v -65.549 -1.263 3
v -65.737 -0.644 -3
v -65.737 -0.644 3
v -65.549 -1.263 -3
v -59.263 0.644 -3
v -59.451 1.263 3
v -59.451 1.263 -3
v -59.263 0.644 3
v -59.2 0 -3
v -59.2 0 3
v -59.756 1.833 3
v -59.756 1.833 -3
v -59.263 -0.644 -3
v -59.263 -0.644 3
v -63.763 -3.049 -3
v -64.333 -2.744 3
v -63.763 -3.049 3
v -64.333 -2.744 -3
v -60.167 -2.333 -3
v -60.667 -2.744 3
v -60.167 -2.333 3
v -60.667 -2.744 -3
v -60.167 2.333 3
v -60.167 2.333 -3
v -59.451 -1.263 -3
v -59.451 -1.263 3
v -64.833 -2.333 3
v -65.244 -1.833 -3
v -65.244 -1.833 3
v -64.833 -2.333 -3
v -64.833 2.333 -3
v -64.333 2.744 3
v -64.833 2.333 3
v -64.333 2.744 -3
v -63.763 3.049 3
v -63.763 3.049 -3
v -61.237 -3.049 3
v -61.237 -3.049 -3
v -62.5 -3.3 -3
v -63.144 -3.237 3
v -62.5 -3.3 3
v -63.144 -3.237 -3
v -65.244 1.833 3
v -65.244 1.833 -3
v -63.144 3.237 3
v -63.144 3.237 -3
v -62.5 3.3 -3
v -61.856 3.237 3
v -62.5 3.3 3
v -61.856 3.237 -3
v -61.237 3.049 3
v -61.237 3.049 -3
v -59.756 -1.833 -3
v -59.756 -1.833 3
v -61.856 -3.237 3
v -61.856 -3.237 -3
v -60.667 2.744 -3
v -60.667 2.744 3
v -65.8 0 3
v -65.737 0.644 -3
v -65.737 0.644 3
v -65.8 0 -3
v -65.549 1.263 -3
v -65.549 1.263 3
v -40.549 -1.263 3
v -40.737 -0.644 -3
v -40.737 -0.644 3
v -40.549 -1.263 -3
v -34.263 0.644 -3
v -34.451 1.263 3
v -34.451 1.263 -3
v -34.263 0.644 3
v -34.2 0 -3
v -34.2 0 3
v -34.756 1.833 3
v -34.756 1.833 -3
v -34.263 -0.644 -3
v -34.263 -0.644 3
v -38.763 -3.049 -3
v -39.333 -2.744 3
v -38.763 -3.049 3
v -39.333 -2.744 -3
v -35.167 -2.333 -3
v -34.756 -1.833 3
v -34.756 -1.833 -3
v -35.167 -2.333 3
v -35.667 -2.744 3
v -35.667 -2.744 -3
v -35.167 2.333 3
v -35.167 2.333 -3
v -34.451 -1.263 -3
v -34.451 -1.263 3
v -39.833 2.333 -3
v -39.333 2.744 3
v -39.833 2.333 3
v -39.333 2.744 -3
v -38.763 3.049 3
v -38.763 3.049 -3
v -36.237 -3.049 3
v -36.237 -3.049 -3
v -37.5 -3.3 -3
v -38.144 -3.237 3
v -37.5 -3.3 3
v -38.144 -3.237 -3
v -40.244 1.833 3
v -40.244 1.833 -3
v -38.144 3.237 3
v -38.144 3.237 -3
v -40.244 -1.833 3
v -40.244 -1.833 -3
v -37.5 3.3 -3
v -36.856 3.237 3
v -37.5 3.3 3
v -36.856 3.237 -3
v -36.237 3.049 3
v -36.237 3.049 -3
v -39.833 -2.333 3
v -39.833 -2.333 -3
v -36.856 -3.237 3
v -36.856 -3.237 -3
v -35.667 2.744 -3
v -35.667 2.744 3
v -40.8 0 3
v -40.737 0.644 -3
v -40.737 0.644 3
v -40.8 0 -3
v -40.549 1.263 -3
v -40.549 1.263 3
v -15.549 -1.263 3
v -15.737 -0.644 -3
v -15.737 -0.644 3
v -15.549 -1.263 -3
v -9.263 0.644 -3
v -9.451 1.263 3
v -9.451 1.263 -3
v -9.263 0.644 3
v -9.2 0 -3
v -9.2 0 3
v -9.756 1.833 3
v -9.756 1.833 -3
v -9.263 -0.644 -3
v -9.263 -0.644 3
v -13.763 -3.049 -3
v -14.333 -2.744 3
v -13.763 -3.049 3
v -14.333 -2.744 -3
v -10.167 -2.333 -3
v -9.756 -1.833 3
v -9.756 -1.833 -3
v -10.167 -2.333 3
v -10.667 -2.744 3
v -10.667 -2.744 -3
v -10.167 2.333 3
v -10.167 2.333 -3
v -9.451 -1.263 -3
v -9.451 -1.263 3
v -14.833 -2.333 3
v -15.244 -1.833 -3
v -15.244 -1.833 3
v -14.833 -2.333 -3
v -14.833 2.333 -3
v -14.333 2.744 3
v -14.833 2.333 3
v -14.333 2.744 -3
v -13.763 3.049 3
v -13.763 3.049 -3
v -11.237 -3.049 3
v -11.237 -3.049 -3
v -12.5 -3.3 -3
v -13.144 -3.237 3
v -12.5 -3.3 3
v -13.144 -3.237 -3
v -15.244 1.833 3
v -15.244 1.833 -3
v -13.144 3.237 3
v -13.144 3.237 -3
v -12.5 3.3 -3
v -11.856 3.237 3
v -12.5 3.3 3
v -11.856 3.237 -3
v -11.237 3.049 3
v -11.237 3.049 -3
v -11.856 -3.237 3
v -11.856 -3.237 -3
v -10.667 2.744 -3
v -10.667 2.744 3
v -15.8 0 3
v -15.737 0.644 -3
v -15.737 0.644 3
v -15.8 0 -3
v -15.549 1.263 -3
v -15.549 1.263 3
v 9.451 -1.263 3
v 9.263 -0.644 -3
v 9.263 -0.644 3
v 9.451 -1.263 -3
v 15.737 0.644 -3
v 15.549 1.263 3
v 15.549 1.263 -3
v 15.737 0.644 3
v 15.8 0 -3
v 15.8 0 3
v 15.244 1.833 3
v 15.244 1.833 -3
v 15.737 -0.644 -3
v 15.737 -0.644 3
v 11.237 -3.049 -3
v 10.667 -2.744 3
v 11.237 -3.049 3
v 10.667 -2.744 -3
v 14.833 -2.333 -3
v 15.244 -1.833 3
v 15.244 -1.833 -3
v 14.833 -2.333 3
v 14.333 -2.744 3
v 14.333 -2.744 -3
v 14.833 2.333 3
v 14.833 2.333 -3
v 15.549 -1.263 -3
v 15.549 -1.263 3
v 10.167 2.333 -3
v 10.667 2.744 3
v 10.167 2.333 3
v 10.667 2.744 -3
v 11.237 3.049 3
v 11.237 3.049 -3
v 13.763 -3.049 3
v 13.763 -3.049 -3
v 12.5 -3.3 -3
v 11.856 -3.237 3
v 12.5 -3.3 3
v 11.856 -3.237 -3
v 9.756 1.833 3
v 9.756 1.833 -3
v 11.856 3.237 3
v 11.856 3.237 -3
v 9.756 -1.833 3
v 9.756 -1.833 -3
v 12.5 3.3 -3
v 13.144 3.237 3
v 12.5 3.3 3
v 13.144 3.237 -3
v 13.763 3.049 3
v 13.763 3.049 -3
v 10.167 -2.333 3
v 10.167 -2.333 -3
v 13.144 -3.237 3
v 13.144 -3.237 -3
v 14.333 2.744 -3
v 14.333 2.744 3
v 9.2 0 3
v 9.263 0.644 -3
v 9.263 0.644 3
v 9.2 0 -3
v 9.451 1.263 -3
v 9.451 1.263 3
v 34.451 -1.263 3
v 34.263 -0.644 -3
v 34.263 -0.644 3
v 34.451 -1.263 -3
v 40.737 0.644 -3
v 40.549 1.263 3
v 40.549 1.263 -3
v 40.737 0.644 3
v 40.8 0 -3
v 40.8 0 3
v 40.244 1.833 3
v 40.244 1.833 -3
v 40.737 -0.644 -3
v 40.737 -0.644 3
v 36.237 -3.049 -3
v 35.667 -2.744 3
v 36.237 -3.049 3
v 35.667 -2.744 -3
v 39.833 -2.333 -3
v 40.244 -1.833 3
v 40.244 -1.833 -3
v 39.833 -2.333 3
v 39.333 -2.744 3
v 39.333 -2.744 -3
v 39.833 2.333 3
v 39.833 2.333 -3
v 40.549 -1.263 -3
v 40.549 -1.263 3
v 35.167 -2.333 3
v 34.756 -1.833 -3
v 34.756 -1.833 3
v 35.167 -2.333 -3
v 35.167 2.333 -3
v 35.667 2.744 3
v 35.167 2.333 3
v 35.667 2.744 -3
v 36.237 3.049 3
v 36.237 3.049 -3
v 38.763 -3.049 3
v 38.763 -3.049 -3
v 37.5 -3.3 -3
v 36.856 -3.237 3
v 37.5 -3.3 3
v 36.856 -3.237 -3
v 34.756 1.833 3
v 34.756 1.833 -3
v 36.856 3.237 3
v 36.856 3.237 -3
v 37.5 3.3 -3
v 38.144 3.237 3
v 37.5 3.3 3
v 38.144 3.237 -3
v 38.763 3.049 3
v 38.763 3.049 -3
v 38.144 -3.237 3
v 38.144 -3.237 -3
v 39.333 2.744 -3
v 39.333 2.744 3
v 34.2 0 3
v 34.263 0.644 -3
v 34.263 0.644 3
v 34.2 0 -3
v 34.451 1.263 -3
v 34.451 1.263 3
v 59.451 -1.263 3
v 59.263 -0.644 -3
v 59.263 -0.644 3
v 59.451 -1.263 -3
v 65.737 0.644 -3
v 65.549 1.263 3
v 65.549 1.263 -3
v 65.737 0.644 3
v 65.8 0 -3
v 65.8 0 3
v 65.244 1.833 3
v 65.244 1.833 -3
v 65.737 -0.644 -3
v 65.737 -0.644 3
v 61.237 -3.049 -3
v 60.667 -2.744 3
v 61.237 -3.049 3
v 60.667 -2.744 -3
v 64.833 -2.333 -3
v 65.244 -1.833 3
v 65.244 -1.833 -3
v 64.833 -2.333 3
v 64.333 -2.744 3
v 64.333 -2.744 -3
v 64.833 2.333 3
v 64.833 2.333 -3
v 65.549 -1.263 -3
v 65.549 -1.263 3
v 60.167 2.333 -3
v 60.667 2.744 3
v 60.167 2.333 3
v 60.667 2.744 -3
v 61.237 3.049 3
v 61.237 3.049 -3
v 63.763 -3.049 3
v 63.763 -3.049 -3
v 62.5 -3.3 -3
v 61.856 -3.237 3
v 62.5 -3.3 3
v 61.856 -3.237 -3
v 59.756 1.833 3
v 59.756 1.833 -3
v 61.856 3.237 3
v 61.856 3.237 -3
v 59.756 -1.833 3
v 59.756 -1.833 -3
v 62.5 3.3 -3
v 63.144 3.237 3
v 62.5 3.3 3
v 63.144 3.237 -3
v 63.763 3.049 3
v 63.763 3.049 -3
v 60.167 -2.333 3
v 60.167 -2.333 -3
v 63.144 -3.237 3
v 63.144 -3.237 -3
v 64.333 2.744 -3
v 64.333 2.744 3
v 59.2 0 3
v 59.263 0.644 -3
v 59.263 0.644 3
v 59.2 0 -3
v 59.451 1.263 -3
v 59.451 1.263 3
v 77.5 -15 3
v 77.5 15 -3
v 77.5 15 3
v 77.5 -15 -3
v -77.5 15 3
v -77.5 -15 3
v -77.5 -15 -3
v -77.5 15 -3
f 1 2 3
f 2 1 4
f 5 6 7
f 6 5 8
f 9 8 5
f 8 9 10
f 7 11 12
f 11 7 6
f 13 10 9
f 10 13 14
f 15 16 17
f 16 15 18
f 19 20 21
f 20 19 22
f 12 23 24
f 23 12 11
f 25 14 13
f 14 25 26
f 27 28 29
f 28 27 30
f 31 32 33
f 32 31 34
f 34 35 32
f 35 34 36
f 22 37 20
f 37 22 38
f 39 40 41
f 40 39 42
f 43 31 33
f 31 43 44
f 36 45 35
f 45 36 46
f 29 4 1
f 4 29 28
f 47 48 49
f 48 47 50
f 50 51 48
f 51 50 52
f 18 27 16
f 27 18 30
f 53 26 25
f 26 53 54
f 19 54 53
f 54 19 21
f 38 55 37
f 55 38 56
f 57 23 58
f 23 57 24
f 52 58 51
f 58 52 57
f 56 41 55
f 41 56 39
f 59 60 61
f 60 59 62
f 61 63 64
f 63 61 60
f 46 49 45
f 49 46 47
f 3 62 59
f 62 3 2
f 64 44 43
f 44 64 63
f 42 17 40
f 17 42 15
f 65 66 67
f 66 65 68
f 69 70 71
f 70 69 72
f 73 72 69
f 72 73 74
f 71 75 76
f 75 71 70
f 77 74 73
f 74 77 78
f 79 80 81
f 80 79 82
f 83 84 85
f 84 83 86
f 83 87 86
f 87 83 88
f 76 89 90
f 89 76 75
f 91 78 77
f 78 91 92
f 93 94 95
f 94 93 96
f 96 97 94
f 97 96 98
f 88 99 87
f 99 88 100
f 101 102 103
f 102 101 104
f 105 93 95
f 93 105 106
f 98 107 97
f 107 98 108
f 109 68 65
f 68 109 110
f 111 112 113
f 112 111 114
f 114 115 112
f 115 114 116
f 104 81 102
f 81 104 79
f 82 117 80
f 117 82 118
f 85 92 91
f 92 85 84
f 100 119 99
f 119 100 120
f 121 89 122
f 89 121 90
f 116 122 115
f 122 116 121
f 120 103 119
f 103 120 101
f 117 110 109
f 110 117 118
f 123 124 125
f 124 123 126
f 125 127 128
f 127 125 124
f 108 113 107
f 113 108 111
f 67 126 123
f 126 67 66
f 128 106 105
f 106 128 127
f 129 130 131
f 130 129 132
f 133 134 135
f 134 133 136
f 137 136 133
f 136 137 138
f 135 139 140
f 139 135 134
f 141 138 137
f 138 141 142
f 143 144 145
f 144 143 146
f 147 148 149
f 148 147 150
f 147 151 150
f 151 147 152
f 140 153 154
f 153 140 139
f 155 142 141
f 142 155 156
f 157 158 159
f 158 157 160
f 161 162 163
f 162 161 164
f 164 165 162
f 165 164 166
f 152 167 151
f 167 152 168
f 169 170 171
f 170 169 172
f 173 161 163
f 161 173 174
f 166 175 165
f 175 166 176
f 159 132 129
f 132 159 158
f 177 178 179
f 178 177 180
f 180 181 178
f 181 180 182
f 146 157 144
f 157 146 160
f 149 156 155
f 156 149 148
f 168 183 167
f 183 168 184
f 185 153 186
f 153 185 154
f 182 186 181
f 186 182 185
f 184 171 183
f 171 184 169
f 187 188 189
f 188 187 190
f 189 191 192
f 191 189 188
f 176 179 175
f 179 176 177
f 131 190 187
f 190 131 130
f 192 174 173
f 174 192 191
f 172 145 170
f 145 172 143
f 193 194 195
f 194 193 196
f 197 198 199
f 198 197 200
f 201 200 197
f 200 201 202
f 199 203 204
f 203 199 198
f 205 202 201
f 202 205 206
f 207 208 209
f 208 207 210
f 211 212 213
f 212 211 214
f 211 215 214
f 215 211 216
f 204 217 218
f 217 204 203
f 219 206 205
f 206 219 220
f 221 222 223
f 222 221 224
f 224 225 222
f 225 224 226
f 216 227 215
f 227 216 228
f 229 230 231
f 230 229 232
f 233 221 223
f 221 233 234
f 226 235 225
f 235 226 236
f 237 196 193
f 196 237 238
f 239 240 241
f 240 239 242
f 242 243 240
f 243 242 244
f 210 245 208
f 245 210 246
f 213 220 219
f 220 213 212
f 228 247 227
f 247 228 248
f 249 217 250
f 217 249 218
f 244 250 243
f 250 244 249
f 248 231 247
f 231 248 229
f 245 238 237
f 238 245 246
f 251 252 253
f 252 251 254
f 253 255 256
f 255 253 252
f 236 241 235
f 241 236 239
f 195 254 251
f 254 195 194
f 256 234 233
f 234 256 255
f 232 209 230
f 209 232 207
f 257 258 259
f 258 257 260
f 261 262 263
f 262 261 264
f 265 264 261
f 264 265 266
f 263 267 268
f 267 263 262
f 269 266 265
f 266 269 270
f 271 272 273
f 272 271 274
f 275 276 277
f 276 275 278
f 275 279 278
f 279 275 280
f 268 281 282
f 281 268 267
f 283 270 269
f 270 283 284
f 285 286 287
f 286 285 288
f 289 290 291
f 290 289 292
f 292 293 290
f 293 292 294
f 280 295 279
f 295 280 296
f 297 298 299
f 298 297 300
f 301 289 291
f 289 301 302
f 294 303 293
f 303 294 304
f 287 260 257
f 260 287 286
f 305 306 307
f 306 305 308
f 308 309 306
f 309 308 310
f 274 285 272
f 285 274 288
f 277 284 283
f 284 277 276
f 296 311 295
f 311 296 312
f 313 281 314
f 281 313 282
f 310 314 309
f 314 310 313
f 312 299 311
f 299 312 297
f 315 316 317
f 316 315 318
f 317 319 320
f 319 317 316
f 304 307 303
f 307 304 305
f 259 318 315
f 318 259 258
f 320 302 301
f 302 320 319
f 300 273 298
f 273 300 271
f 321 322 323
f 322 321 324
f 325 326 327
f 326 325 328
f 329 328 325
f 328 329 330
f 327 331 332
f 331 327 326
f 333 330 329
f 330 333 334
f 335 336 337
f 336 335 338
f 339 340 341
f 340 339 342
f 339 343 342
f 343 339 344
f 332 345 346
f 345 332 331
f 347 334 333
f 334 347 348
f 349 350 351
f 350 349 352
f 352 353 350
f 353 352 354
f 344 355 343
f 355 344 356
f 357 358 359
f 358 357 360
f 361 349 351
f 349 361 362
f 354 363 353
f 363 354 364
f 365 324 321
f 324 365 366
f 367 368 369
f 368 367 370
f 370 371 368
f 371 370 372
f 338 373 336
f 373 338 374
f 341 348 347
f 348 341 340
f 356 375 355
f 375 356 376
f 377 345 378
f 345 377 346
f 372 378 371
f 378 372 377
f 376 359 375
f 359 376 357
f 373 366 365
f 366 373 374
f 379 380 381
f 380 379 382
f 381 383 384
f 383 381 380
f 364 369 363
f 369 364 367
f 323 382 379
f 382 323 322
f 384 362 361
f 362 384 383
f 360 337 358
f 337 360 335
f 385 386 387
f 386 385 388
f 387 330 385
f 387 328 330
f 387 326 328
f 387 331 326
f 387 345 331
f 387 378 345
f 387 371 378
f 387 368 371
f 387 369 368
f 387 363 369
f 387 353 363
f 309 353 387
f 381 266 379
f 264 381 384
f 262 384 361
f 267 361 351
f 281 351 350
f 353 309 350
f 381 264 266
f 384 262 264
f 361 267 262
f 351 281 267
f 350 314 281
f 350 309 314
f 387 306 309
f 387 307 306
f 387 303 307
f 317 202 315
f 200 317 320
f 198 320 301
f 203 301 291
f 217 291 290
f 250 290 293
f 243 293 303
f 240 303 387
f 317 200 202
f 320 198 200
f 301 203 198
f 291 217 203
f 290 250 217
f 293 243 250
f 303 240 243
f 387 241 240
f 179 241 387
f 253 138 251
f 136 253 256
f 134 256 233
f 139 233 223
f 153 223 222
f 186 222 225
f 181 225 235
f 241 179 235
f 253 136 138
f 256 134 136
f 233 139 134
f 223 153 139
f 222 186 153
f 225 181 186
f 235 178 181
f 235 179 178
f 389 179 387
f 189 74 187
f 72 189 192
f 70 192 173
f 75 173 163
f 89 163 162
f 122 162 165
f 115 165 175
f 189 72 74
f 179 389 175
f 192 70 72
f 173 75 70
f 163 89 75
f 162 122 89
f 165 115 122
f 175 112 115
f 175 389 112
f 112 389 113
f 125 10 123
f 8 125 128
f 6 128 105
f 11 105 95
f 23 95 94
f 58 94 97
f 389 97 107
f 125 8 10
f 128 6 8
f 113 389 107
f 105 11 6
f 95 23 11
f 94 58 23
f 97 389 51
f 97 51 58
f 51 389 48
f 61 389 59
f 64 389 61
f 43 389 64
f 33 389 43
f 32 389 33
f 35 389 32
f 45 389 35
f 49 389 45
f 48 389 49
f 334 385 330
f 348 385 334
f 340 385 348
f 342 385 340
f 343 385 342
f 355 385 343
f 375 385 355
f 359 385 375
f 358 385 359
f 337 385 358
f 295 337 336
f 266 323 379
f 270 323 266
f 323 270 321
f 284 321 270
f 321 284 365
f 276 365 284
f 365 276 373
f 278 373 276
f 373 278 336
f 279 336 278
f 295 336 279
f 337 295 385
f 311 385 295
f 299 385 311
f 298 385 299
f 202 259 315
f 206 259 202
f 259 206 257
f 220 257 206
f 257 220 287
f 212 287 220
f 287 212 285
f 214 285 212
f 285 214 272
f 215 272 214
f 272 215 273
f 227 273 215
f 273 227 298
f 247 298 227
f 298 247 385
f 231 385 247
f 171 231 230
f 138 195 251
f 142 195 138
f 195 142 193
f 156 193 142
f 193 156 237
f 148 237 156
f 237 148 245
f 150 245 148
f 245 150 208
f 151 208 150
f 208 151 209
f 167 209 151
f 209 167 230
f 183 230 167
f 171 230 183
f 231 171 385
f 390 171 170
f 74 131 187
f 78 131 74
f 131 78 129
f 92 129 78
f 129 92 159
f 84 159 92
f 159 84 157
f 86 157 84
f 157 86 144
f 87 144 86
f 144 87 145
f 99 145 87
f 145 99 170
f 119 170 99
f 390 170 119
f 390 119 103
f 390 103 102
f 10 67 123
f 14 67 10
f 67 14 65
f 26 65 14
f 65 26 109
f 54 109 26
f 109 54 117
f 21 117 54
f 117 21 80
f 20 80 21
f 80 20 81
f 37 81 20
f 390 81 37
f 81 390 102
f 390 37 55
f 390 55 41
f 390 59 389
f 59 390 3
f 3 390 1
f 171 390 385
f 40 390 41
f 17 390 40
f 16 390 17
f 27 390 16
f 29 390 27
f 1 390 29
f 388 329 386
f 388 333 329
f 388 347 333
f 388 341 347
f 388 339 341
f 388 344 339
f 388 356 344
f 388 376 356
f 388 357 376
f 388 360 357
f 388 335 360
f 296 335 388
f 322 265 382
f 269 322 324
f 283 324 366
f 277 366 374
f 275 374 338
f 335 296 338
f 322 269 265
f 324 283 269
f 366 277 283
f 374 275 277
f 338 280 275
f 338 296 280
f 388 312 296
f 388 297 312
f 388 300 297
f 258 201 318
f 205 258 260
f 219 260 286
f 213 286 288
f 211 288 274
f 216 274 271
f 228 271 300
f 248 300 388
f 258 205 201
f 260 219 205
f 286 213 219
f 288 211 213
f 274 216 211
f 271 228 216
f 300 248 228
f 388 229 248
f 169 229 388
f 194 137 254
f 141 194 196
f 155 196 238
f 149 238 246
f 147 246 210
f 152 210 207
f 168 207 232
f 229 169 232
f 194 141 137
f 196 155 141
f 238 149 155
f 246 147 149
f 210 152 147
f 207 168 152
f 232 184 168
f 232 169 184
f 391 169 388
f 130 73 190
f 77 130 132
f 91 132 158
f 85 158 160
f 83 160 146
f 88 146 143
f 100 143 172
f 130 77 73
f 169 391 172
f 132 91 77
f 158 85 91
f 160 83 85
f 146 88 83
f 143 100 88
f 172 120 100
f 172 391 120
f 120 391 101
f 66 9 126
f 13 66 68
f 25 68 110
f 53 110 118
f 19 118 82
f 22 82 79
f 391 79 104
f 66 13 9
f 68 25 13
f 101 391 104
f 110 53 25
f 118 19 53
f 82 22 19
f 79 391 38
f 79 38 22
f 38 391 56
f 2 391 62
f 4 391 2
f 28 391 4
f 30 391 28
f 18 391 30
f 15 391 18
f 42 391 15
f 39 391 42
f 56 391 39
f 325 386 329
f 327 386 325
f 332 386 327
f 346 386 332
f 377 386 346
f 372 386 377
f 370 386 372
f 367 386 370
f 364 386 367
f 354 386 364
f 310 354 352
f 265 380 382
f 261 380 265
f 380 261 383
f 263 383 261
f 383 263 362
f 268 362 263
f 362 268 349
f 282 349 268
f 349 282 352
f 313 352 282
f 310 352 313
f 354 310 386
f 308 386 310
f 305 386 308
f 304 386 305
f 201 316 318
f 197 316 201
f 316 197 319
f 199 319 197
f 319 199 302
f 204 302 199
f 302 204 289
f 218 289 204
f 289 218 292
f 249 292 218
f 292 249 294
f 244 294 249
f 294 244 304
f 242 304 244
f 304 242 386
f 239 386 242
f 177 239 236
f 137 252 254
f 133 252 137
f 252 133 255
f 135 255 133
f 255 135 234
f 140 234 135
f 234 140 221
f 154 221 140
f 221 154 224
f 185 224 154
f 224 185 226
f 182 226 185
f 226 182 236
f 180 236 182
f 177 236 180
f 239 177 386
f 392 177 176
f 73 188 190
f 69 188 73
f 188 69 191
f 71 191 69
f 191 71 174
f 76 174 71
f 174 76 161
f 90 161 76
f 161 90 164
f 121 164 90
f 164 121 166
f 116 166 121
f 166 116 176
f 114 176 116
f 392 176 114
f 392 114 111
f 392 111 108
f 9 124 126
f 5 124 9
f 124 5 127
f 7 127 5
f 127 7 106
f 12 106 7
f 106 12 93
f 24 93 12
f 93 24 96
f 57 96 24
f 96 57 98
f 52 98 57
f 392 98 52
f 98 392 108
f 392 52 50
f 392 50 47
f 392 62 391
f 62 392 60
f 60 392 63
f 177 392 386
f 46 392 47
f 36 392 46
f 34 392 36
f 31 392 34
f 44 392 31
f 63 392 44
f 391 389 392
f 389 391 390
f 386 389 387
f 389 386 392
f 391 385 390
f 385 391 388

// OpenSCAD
$fn = 32;

// ----------------------------------------------------------------------
// Hole bar, 6 x Ø6.6
// row layout, 15 mm edge offset
// ----------------------------------------------------------------------

// --- parameters (mm) ---
bar_w = 30;    // bar width (Y)
bar_t = 6;     // bar thickness (Z)
holes = 6;     // holes per row
hole_d = 6.6;  // hole diameter
edge = 15;     // offset from the bar end to the first hole
pitch = 25;    // pitch between neighbouring holes

// --- derived feature positions (mm) ---
span = (holes - 1) * pitch;   // = 125   distance between the end holes
bar_l = span + 2 * edge;      // = 155   overall bar length
start_x = -bar_l / 2 + edge;  // = -62.5   X of the first hole
feature_centers = [
  [start_x + 0 * pitch, 0],
  [start_x + 1 * pitch, 0],
  [start_x + 2 * pitch, 0],
  [start_x + 3 * pitch, 0],
  [start_x + 4 * pitch, 0],
  [start_x + 5 * pitch, 0]
];   // hole centres of the first row

// bar with one row of holes, drilled from feature_centers
difference() {
  translate([-bar_l / 2, -bar_w / 2, -bar_t / 2]) cube([bar_l, bar_w, bar_t]);
  for (centre = feature_centers)
    translate([centre[0], centre[1], 0])
      cylinder(d = hole_d, h = bar_t + 2, center = true);
}
